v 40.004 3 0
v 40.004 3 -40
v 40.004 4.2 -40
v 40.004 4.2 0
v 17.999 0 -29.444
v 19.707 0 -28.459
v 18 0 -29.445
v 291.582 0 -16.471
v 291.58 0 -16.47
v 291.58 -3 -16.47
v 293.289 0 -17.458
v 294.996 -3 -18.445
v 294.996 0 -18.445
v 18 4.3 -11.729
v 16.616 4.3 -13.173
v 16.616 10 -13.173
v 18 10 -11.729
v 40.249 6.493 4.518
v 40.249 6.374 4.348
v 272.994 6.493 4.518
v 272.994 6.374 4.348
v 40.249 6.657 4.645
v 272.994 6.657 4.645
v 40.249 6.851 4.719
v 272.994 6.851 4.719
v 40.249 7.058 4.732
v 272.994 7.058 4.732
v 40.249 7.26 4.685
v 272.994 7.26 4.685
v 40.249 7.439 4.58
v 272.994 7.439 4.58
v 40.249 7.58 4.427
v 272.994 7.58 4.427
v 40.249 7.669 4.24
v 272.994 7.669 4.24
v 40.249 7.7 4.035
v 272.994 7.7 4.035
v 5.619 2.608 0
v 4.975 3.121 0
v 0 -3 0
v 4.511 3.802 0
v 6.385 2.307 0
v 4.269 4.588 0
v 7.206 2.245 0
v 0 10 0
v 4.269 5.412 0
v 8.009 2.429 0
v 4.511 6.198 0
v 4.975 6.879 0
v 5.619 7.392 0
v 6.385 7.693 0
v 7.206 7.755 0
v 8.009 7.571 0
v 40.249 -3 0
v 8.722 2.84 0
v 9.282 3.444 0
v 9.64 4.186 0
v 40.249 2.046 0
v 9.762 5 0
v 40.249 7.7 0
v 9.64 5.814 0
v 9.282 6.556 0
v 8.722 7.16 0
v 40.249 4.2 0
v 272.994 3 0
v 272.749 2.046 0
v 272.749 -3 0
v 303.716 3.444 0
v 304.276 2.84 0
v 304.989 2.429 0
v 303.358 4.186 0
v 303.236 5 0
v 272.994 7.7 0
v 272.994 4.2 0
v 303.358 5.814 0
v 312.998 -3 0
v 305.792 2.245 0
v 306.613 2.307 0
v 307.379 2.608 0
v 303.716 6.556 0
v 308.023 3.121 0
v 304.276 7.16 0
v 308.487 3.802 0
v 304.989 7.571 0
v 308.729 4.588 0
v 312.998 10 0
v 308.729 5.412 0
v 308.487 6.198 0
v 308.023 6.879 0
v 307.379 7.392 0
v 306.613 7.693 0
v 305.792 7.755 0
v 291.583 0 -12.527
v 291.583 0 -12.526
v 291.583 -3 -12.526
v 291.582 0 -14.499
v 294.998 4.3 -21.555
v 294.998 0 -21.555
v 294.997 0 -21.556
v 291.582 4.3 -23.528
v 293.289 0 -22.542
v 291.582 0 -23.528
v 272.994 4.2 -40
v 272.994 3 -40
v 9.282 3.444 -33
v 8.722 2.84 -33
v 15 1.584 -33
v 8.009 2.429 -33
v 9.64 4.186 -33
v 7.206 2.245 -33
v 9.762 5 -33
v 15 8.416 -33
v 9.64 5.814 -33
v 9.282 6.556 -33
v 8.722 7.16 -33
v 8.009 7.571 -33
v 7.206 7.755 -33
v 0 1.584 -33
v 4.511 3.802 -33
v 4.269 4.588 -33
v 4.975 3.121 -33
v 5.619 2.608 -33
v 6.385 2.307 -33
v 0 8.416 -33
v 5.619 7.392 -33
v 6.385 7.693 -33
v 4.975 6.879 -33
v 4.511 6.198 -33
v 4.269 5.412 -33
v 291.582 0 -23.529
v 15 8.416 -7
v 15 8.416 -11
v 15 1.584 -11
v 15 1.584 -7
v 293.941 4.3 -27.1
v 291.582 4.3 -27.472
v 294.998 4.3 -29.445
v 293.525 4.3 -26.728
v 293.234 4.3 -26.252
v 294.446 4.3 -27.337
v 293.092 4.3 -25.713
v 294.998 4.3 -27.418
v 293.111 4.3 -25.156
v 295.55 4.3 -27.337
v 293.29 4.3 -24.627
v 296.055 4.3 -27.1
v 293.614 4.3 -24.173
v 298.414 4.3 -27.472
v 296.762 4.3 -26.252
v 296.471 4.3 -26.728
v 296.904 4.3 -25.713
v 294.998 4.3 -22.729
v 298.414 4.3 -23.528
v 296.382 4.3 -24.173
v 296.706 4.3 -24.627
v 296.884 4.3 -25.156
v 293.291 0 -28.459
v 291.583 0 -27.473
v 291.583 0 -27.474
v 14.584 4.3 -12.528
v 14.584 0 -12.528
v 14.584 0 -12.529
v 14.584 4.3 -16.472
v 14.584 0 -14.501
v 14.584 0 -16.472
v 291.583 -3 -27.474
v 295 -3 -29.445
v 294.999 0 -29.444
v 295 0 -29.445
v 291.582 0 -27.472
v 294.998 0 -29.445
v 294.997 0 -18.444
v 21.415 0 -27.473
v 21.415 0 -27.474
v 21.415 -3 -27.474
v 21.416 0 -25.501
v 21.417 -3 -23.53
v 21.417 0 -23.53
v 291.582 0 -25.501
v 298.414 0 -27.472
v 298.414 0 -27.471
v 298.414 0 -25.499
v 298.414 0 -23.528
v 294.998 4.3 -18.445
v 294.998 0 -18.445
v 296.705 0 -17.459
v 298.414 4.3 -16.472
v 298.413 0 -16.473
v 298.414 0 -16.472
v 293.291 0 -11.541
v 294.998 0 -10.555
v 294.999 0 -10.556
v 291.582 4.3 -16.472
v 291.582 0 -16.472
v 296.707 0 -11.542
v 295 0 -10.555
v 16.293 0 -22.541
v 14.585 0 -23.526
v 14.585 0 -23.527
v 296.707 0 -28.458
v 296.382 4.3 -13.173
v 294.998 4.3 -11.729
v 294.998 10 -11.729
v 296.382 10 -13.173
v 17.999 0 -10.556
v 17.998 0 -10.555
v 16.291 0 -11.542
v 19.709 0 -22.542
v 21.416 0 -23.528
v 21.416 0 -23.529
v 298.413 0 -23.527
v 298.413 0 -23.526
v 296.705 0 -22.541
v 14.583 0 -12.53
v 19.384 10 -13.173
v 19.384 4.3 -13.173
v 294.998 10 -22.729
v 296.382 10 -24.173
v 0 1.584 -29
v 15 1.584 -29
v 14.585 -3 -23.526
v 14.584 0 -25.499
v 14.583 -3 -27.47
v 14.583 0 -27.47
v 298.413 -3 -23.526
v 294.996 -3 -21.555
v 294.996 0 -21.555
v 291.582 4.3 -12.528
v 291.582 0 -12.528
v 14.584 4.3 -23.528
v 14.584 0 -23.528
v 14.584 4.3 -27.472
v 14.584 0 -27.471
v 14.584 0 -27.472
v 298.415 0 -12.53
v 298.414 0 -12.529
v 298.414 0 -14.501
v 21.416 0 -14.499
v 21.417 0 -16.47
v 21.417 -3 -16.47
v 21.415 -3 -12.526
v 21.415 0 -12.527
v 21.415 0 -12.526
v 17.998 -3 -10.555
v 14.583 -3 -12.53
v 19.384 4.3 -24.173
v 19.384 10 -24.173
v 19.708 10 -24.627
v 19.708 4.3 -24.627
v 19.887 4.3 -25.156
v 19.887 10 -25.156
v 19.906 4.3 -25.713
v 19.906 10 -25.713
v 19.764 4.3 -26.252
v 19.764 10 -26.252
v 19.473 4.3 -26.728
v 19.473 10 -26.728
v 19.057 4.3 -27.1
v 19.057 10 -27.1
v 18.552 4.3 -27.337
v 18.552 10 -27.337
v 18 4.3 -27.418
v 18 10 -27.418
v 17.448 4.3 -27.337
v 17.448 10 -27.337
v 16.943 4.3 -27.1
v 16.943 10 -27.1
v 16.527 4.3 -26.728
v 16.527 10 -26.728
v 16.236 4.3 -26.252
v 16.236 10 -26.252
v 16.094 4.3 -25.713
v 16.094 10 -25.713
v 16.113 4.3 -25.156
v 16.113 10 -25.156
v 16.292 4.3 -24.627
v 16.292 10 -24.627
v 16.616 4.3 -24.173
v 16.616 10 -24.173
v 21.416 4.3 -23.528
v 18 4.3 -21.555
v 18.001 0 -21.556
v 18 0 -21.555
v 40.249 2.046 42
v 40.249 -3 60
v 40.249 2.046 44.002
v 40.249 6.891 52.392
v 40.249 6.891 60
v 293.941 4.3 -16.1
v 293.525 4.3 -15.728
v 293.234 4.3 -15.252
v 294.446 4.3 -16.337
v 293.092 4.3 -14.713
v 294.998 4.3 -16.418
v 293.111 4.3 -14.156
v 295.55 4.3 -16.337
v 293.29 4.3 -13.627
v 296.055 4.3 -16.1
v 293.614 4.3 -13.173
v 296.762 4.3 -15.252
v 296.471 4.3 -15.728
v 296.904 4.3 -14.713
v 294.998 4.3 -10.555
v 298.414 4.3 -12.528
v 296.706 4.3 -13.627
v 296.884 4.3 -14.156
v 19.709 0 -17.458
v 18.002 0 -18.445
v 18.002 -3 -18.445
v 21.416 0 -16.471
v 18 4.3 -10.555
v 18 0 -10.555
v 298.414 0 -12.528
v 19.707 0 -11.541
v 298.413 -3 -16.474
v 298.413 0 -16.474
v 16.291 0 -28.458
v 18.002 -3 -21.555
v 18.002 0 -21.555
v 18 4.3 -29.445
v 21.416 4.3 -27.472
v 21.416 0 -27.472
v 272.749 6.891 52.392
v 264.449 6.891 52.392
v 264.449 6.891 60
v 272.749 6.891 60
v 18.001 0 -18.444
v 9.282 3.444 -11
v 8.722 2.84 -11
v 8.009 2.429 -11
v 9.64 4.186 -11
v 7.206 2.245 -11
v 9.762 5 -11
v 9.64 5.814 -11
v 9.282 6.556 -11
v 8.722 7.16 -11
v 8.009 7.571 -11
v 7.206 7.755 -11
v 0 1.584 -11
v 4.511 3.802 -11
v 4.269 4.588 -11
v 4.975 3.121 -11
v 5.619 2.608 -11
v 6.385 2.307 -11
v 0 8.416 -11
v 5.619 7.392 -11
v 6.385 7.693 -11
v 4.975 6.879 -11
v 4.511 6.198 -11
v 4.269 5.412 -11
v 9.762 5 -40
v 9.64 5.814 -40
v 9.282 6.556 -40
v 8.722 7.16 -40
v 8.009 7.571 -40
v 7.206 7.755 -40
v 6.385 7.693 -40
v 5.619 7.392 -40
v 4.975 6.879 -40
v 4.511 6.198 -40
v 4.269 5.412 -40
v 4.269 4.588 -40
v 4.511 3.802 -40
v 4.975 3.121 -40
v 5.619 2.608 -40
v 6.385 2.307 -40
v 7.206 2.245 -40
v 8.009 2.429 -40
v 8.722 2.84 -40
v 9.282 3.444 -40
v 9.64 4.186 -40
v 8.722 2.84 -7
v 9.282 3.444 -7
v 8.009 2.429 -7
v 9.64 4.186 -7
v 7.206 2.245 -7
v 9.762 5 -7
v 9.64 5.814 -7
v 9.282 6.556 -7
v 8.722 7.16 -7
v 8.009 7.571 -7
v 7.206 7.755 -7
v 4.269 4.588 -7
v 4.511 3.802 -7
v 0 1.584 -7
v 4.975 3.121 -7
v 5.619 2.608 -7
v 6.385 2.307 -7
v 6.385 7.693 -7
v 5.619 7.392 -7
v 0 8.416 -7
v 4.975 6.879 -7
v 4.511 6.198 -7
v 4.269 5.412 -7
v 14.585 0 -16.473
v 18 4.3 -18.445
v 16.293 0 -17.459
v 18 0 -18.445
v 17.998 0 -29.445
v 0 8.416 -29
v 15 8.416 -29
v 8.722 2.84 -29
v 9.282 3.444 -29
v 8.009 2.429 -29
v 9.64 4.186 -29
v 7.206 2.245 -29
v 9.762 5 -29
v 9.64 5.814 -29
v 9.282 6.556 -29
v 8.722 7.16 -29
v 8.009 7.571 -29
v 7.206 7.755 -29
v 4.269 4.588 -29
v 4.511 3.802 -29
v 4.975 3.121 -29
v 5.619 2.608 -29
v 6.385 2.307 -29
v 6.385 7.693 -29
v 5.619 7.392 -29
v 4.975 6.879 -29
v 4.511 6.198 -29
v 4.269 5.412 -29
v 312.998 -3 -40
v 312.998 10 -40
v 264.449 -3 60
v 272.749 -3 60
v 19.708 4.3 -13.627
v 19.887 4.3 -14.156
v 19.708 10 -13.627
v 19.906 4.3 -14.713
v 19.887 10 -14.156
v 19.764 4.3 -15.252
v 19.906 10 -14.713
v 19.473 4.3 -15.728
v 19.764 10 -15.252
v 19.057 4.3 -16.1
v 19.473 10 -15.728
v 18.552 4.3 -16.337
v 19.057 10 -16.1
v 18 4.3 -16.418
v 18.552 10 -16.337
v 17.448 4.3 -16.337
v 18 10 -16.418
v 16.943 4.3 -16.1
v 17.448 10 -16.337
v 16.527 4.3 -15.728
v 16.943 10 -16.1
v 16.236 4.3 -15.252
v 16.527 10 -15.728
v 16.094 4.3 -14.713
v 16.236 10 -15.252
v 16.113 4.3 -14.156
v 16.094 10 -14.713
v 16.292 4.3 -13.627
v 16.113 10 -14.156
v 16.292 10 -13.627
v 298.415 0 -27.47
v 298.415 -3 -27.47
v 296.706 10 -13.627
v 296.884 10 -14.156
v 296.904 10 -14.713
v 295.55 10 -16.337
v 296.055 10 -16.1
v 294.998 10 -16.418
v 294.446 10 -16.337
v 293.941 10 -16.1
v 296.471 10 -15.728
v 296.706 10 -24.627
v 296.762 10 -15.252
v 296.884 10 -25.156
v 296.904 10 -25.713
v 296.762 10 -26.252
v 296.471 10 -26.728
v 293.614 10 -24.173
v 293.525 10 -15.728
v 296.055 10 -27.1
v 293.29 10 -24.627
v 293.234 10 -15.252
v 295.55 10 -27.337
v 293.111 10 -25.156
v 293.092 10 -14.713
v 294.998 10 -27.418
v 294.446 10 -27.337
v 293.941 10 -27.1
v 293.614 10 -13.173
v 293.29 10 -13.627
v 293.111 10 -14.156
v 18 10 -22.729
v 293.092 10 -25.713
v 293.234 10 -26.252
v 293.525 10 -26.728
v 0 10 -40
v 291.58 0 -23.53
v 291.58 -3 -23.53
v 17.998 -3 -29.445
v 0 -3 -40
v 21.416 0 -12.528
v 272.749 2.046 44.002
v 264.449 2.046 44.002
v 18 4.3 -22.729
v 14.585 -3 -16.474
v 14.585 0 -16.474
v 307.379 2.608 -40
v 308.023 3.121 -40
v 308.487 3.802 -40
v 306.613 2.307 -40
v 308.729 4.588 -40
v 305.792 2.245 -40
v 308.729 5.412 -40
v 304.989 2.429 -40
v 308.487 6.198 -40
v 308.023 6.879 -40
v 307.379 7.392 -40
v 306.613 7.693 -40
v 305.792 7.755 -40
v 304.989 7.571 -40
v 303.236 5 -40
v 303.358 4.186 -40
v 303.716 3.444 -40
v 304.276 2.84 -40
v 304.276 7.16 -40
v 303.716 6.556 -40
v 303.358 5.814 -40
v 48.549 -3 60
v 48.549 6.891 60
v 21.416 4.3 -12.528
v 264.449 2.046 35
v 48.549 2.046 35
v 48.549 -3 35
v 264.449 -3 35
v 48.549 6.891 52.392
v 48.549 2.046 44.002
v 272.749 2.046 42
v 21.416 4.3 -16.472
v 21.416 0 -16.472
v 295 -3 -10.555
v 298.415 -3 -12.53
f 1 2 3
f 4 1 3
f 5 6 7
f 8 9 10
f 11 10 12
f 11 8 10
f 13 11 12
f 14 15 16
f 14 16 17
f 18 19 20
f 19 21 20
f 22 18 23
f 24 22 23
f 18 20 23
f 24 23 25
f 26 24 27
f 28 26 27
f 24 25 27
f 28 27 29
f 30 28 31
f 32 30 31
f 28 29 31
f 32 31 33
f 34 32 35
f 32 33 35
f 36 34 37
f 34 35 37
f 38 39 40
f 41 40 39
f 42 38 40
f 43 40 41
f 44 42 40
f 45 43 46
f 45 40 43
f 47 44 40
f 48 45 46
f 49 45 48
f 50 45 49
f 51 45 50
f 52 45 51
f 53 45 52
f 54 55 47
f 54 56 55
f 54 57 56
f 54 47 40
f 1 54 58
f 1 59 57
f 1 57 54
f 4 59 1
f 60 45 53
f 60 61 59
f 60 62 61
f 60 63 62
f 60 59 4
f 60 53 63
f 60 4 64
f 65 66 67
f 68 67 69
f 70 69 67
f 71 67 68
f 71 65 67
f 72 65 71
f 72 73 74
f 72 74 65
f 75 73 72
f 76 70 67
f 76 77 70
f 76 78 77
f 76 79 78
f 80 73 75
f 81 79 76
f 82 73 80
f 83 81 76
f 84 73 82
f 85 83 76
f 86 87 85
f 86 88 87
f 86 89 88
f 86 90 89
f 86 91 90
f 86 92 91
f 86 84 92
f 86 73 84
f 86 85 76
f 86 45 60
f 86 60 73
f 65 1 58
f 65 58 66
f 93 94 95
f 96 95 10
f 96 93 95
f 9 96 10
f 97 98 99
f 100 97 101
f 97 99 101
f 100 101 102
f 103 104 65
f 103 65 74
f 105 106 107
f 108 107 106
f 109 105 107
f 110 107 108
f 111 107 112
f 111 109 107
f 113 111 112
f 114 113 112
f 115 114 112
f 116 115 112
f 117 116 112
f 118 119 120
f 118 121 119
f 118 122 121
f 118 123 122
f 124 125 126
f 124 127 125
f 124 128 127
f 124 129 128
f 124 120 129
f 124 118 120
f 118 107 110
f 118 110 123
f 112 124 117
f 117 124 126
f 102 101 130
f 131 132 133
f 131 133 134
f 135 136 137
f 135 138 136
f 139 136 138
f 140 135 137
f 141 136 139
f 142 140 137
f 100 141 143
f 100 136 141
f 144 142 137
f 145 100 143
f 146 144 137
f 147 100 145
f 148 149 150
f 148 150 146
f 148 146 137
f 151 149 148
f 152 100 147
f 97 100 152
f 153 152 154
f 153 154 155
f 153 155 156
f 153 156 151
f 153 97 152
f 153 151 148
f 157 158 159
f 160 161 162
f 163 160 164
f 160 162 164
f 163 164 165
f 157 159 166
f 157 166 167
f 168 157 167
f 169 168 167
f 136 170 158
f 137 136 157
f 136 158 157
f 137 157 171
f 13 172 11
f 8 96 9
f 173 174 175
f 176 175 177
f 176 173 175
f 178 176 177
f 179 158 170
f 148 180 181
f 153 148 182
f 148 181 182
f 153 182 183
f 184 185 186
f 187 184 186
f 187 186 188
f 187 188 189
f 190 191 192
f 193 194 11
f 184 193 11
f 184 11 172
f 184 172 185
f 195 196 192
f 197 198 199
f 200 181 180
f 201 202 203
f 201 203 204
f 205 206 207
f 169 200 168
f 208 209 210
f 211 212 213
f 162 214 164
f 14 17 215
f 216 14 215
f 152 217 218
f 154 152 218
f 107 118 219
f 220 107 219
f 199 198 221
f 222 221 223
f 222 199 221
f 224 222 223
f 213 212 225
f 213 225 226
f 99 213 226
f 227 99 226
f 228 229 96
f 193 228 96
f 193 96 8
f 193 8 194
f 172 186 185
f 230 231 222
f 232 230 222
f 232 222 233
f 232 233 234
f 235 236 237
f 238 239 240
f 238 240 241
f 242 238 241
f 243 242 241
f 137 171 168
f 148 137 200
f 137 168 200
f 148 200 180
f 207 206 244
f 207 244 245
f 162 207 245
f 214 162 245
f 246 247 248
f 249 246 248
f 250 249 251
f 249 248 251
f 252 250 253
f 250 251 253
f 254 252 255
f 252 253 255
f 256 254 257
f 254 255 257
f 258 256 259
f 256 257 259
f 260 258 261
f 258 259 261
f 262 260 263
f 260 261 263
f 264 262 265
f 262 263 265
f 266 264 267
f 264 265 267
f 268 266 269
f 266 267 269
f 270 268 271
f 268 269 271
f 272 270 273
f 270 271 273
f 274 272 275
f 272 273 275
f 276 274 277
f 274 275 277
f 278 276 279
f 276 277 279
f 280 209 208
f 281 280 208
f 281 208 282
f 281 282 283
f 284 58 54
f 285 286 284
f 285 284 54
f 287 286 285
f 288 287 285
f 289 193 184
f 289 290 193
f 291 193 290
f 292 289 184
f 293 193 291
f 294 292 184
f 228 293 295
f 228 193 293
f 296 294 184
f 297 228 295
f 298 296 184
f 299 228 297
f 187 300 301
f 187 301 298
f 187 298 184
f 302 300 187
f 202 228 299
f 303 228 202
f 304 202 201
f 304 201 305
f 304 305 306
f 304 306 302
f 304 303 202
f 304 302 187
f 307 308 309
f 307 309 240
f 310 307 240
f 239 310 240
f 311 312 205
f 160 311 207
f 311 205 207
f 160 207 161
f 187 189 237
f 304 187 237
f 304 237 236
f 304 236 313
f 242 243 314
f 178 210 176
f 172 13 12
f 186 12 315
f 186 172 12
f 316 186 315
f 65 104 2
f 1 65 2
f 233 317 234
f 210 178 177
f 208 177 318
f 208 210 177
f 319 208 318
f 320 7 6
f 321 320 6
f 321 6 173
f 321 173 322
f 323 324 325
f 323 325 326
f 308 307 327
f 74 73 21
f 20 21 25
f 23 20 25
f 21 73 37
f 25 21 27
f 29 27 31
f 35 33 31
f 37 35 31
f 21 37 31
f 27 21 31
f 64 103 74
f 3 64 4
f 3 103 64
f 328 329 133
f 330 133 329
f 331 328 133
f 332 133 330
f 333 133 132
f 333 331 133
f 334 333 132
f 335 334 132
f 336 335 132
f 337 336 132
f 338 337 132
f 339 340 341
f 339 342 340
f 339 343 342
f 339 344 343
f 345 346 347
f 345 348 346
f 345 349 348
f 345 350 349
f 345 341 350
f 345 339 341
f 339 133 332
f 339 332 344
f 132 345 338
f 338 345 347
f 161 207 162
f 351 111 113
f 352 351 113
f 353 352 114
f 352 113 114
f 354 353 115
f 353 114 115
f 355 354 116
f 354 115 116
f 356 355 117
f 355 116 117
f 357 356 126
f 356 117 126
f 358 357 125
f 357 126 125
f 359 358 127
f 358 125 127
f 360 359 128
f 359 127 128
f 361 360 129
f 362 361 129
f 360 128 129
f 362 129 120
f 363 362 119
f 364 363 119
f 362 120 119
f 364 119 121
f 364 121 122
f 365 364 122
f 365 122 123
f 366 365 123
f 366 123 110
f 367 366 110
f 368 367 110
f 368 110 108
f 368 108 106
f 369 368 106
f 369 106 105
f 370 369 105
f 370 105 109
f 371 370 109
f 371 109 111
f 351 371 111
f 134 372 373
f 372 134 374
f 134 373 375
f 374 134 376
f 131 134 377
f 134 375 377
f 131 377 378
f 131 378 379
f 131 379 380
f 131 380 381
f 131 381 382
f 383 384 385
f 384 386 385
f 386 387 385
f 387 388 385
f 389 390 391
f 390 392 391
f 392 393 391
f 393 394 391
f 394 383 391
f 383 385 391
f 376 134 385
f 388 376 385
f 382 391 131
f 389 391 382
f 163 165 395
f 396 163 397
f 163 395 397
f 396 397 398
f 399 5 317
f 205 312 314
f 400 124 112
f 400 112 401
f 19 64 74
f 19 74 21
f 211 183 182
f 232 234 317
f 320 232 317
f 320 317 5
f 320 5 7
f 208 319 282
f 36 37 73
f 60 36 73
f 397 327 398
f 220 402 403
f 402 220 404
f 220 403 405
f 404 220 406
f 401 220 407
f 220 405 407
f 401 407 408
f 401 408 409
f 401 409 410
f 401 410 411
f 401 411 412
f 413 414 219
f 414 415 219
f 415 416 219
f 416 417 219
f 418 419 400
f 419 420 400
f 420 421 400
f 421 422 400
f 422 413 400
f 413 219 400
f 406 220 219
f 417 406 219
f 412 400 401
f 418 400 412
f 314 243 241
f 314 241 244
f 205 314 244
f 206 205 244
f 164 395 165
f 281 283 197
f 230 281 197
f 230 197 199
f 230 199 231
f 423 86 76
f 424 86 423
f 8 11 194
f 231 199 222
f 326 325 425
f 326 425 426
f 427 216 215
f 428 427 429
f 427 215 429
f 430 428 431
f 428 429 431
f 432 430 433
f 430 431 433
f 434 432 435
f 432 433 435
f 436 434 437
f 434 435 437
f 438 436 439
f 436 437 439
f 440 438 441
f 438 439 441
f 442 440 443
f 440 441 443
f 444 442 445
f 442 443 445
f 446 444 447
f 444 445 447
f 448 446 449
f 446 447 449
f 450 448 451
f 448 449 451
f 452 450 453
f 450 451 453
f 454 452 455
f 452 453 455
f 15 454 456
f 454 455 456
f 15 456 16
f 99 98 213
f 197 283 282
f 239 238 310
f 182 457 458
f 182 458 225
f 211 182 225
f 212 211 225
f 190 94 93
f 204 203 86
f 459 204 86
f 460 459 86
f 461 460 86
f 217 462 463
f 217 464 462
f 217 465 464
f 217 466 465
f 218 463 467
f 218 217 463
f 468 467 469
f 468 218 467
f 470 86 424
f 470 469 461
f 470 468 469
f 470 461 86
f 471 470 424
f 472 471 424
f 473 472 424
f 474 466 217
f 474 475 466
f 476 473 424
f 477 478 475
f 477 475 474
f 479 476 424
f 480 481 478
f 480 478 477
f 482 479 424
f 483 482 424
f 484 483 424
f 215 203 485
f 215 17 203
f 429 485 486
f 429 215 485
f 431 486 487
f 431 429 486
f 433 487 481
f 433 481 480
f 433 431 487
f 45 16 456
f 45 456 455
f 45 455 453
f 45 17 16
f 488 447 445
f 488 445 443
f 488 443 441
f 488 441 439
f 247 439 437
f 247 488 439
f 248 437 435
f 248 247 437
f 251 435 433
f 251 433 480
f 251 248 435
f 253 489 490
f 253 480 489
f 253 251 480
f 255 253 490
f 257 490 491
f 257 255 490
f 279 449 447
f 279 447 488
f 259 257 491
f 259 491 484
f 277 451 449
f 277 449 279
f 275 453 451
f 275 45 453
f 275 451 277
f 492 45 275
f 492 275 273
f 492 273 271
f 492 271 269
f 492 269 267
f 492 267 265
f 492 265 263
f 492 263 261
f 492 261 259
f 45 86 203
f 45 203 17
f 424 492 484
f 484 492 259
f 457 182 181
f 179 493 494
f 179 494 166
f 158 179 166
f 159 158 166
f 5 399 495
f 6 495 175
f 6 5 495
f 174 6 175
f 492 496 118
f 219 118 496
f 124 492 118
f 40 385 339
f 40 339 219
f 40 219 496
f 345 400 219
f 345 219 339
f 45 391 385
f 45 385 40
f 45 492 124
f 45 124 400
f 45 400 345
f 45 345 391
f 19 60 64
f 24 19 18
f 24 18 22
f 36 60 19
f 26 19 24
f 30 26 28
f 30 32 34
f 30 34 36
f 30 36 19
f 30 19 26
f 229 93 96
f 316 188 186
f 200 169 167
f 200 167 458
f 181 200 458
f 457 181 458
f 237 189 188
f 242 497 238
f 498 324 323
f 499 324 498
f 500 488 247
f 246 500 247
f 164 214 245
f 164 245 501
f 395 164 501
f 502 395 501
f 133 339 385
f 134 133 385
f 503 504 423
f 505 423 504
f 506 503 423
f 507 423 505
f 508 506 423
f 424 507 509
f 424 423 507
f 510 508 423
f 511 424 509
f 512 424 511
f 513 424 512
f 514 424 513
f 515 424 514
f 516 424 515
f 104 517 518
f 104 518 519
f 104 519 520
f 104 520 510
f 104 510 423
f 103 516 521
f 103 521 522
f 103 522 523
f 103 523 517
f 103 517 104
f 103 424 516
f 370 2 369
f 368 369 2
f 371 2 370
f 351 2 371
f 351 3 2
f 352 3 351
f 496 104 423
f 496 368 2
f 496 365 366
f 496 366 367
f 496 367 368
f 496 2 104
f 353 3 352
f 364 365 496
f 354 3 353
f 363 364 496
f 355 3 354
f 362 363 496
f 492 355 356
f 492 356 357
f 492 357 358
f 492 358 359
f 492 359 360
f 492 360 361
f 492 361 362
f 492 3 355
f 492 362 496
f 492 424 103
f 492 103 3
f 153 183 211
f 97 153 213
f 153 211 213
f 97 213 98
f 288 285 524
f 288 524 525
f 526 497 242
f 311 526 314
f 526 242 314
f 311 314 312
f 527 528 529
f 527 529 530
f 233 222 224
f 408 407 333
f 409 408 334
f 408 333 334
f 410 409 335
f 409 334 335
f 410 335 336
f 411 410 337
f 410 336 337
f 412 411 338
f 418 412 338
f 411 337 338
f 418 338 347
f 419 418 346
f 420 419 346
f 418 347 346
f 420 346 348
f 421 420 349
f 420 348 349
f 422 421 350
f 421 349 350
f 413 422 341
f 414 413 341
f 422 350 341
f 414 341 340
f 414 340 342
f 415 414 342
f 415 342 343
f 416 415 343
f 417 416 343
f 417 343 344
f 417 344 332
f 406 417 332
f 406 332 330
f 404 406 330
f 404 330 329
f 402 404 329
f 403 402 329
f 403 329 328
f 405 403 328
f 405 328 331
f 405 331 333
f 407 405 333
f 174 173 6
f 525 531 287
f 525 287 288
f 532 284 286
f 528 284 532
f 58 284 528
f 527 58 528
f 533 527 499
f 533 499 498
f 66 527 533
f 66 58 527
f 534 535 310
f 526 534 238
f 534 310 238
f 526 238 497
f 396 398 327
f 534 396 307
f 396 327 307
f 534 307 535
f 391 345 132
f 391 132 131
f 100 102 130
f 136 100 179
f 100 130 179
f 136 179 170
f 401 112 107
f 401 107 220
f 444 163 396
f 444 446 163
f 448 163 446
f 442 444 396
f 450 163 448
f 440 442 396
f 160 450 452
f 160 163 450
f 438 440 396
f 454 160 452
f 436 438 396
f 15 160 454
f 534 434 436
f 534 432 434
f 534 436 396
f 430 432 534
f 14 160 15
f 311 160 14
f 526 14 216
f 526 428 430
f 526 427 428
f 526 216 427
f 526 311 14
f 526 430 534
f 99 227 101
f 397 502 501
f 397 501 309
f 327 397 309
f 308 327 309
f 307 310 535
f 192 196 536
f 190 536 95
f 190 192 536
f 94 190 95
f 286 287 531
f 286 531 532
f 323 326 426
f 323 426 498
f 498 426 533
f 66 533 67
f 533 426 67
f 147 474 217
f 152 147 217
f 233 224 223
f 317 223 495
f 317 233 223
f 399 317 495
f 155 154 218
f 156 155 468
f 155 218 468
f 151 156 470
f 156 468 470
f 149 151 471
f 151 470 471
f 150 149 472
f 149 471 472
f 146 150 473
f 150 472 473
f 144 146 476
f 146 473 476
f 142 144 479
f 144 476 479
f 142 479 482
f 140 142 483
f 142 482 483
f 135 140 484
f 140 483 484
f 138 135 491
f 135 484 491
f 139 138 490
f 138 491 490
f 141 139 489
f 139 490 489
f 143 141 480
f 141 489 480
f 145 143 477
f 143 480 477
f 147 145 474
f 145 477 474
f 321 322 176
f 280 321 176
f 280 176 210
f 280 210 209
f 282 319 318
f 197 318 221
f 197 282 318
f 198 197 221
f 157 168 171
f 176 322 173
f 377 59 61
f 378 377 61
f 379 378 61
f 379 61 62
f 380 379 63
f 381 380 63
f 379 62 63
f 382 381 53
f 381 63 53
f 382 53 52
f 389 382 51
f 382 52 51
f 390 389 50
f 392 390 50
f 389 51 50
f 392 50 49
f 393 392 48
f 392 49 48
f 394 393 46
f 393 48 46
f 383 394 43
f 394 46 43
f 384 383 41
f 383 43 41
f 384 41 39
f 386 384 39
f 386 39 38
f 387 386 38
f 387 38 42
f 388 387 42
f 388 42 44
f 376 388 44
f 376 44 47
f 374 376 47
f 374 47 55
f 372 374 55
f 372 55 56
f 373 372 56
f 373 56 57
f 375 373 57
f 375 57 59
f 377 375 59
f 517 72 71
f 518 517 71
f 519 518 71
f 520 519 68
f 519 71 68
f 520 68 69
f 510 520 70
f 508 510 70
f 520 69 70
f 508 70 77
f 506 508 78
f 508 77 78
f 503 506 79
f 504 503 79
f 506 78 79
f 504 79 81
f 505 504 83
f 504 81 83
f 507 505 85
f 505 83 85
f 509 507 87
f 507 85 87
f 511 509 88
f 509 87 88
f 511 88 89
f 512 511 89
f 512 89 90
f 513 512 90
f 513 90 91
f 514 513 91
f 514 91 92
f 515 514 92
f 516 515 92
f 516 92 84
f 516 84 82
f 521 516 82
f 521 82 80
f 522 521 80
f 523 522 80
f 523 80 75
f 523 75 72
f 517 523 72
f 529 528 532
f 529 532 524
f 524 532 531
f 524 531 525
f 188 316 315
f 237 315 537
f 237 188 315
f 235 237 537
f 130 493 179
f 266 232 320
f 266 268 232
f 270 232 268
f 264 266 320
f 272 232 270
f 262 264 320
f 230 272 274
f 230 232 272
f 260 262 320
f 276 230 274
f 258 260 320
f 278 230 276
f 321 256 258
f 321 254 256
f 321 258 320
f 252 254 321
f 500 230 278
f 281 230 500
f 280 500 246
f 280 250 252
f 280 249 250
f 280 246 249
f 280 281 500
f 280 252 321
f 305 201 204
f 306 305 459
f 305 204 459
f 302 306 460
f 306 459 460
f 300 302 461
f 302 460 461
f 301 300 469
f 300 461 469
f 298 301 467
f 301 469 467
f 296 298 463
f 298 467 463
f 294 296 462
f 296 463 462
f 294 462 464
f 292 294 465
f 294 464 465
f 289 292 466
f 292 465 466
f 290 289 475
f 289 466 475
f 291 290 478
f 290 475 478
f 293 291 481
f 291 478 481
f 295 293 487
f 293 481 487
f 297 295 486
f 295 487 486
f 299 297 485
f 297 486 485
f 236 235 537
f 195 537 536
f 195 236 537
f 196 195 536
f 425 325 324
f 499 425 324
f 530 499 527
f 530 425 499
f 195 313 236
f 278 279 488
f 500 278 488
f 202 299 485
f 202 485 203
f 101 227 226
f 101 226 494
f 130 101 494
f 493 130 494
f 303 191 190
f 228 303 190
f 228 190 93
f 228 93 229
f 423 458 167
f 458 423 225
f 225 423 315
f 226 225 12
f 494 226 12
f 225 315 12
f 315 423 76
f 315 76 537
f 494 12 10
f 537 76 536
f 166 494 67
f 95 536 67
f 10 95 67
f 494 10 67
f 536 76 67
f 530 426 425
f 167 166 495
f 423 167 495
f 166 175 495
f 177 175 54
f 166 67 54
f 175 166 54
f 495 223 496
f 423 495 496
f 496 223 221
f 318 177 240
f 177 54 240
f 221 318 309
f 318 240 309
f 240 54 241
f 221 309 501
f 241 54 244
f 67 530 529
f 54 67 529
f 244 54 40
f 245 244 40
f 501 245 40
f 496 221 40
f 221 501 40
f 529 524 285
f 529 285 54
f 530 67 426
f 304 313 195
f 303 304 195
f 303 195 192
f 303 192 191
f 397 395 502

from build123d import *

# Parameters (mm, degrees)
SKETCH1_W           = 40
SKETCH1_H           = 10
BOSS_EXTRUDE1_DEPTH = 312.997959
SKETCH2_W           = 232.99
SKETCH2_H           = 1.2
CUT_EXTRUDE1_DEPTH  = 316.701951749
SKETCH3_R           = 1.9177
CUT_EXTRUDE2_DEPTH  = 316.701951749
CUT_EXTRUDE3_DEPTH  = 4.3
SKETCH5_R           = 2.762258299
CUT_EXTRUDE4_DEPTH  = 316.701951749
SKETCH6_W           = 4
SKETCH6_H           = 6.8326
CUT_EXTRUDE5_DEPTH  = 15
SKETCH7_W           = 232.5
SKETCH7_H           = 2.046306953
BOSS_EXTRUDE2_DEPTH = 60
CUT_EXTRUDE6_REACH  = 320.796
SKETCH8_W           = 215.9
SKETCH8_H           = 25
BOSS_EXTRUDE3_DEPTH = 3
SKETCH10_W          = 18
SKETCH10_H          = 4.844296322
BOSS_EXTRUDE4_DEPTH = 8.3
BOSS_EXTRUDE6_DEPTH = 232.745
FILLET1_R           = 0.7
SKETCH15_W          = 8.3
SKETCH15_H          = 18
BOSS_EXTRUDE8_DEPTH = 4.844296322
CUT_EXTRUDE8_DEPTH  = 319.961944969
CHAMFER1_SIZE       = 10.392304845
CHAMFER1_SIZE_2     = 6


with BuildPart() as part:
    # Sketch1 → Boss-Extrude1 (new body)
    with BuildSketch(Plane(origin=(0, 0, 0), x_dir=(0, 0, -1), z_dir=(1, 0, 0))):
        with Locations((20, 5)):
            Rectangle(SKETCH1_W, SKETCH1_H)
    extrude(amount=BOSS_EXTRUDE1_DEPTH)

    # Sketch2 → Cut-Extrude1 (cut, through all)
    with BuildSketch(Plane(origin=(0, 0, -40), x_dir=(-1, 0, 0), z_dir=(0, 0, -1))):
        with Locations((-156.4989795, 3.6)):
            Rectangle(SKETCH2_W, SKETCH2_H)
    extrude(amount=-CUT_EXTRUDE1_DEPTH, mode=Mode.SUBTRACT)

    # Sketch3 → Cut-Extrude2 (cut, through all)
    with BuildSketch(Plane(origin=(0, 10, 0), x_dir=(1, 0, 0), z_dir=(0, 1, 0))):
        with Locations(Location((294.997959, 25.5, 0), (0, 0, 270))):
            Circle(SKETCH3_R)
        with Locations(Location((294.997959, 14.5, 0), (0, 0, 270))):
            Circle(SKETCH3_R)
        with Locations(Location((18, 14.5, 0), (0, 0, 90))):
            Circle(SKETCH3_R)
        with Locations(Location((18, 25.5, 0), (0, 0, 90))):
            Circle(SKETCH3_R)
    extrude(amount=-CUT_EXTRUDE2_DEPTH, mode=Mode.SUBTRACT)

    # Sketch4 → Cut-Extrude3 (cut)
    with BuildSketch(Plane.XZ):
        Polygon((14.5837, -12.527598275), (14.5837, -16.472401725), (18, -18.444803449), (21.4163, -16.472401725), (21.4163, -12.527598275), (18, -10.555196551), align=None)
        Polygon((14.5837, -23.527598275), (14.5837, -27.472401725), (18, -29.444803449), (21.4163, -27.472401725), (21.4163, -23.527598275), (18, -21.555196551), align=None)
        Polygon((298.414259, -12.527598275), (294.997959, -10.555196551), (291.581659, -12.527598275), (291.581659, -16.472401725), (294.997959, -18.444803449), (298.414259, -16.472401725), align=None)
        Polygon((291.581659, -23.527598275), (291.581659, -27.472401725), (294.997959, -29.444803449), (298.414259, -27.472401725), (298.414259, -23.527598275), (294.997959, -21.555196551), align=None)
    extrude(amount=-CUT_EXTRUDE3_DEPTH, mode=Mode.SUBTRACT)

    # Sketch5 → Cut-Extrude4 (cut, through all)
    with BuildSketch(Plane.XY):
        with Locations((7, 5)):
            Circle(SKETCH5_R)
        with Locations(Location((305.997959, 5, 0), (0, 0, 180))):
            Circle(SKETCH5_R)
    extrude(amount=-CUT_EXTRUDE4_DEPTH, mode=Mode.SUBTRACT)

    # Sketch6 → Cut-Extrude5 (cut)
    with BuildSketch(Plane.ZY):
        with Locations((-31, 5)):
            Rectangle(SKETCH6_W, SKETCH6_H)
        with Locations((-9, 5)):
            Rectangle(SKETCH6_W, SKETCH6_H)
    extrude(amount=-CUT_EXTRUDE5_DEPTH, mode=Mode.SUBTRACT)

    # Sketch7 → Boss-Extrude2 (add)
    with BuildSketch(Plane.XY):
        with Locations((156.4989795, 1.023153477)):
            Rectangle(SKETCH7_W, SKETCH7_H)
    extrude(amount=BOSS_EXTRUDE2_DEPTH)

    # Sketch8 → Cut-Extrude6 (cut, up to next)
    with BuildSketch(Plane(origin=(0, 2.046306953, 0), x_dir=(1, 0, 0), z_dir=(0, 1, 0)), mode=Mode.PRIVATE) as cut_extrude6_sk1:
        with Locations((156.4989795, -47.5)):
            Rectangle(SKETCH8_W, SKETCH8_H)
    cut_extrude6_tool1 = extrude(cut_extrude6_sk1.sketch, amount=-CUT_EXTRUDE6_REACH, mode=Mode.PRIVATE) & part.part
    add(cut_extrude6_tool1.solids().sort_by_distance((156.49898, 2.046307, 47.5))[0], mode=Mode.SUBTRACT)

    # Sketch9 → Boss-Extrude3 (add)
    with BuildSketch(Plane.XZ):
        Polygon((0, -40), (0, 0), (40.2489795, 0), (40.2489795, 60), (48.5489795, 60), (48.5489795, 35), (264.4489795, 35), (264.4489795, 60), (272.7489795, 60), (272.7489795, 0), (312.997959, 0), (312.997959, -40), align=None)
        Polygon((17.997668231, -10.55519724), (14.582534712, -12.529617991), (14.584866481, -16.474420751), (18.002331769, -18.44480276), (21.417465288, -16.470382009), (21.415133519, -12.525579249), align=None, mode=Mode.SUBTRACT)
        Polygon((18.002331769, -21.55519724), (14.584866481, -23.525579249), (14.582534712, -27.470382009), (17.997668231, -29.44480276), (21.415133519, -27.474420751), (21.417465288, -23.529617991), align=None, mode=Mode.SUBTRACT)
        Polygon((295.000290769, -10.55519724), (291.582825481, -12.525579249), (291.580493712, -16.470382009), (294.995627231, -18.44480276), (298.413092519, -16.474420751), (298.415424288, -12.529617991), align=None, mode=Mode.SUBTRACT)
        Polygon((294.995627231, -21.55519724), (291.580493712, -23.529617991), (291.582825481, -27.474420751), (295.000290769, -29.44480276), (298.415424288, -27.470382009), (298.413092519, -23.525579249), align=None, mode=Mode.SUBTRACT)
    extrude(amount=BOSS_EXTRUDE3_DEPTH)

    # Sketch10 → Boss-Extrude4 (add)
    with BuildSketch(Plane.ZY.offset(-40.2489795)):
        with Locations((51, 4.468455114)):
            Rectangle(SKETCH10_W, SKETCH10_H)
    extrude(amount=-BOSS_EXTRUDE4_DEPTH)

    # Sketch12 → Boss-Extrude6 (add)
    with BuildSketch(Plane.ZY.offset(-40.2489795)):
        Polygon((0, 4.2), (7, 7.7), (0, 7.7), align=None)
    extrude(amount=-BOSS_EXTRUDE6_DEPTH)

    # Fillet1
    fillet1_edges = [part.edges().sort_by_distance(p)[0] for p in [
        (156.6214795, 7.7, 7),
    ]]
    fillet(fillet1_edges, radius=FILLET1_R)

    # Sketch15 → Boss-Extrude8 (add)
    with BuildSketch(Plane(origin=(0, 2.046306953, 0), x_dir=(1, 0, 0), z_dir=(0, 1, 0))):
        with Locations((268.5989795, -51)):
            Rectangle(SKETCH15_W, SKETCH15_H)
    extrude(amount=BOSS_EXTRUDE8_DEPTH)

    # Sketch16 → Cut-Extrude8 (cut, through all)
    with BuildSketch(Plane(origin=(0, 10, 0), x_dir=(1, 0, 0), z_dir=(0, 1, 0))):
        with BuildLine():
            Line((16.61580053, 24.172760339), (18, 22.729156574))
            Line((18, 22.729156574), (19.38419947, 24.172760339))
            ThreePointArc((19.38419947, 24.172760339), (18, 23.5823), (16.61580053, 24.172760339))
        make_face()
        with BuildLine():
            Line((16.61580053, 13.172760339), (18, 11.729156574))
            Line((18, 11.729156574), (19.38419947, 13.172760339))
            ThreePointArc((19.38419947, 13.172760339), (18, 12.5823), (16.61580053, 13.172760339))
        make_face()
        with BuildLine():
            Line((293.61375953, 13.172760339), (294.997959, 11.729156574))
            Line((294.997959, 11.729156574), (296.38215847, 13.172760339))
            ThreePointArc((296.38215847, 13.172760339), (294.997959, 12.5823), (293.61375953, 13.172760339))
        make_face()
        with BuildLine():
            Line((293.61375953, 24.172760339), (294.997959, 22.729156574))
            Line((294.997959, 22.729156574), (296.38215847, 24.172760339))
            ThreePointArc((296.38215847, 24.172760339), (294.997959, 23.5823), (293.61375953, 24.172760339))
        make_face()
    extrude(amount=-CUT_EXTRUDE8_DEPTH, mode=Mode.SUBTRACT)

    # Chamfer1
    # the kernel refuses this chamfer: 10.392304845, 6 mm, written as the material it takes off along each edge
    with BuildSketch(Plane(origin=(13.363195676, 6.890603275, 42), x_dir=(0, 0.019326765612700778, 0.9998132206222079), z_dir=(1, 0, 0))) as chamfer1_piece_1_section:
        Polygon((CHAMFER1_SIZE * 0.999813220662, CHAMFER1_SIZE * 0.0193267656135), (-CHAMFER1_SIZE_2 * 0.0193267656127, CHAMFER1_SIZE_2 * 0.999813220622), (0, 0), align=None)
    chamfer1_piece_1 = extrude(amount=62.071567647, mode=Mode.PRIVATE)
    chamfer1_piece_1 = split(chamfer1_piece_1, bisect_by=Plane(origin=(44.3989795, 2.046306953, 45.647661679), z_dir=(0, 1, 0)), keep=Keep.TOP, mode=Mode.PRIVATE)
    add(chamfer1_piece_1, mode=Mode.SUBTRACT)
    with BuildSketch(Plane(origin=(237.563195676, 6.890603275, 42), x_dir=(0, 0.019326765612700615, 0.9998132206222079), z_dir=(1, 0, 0))) as chamfer1_piece_2_section:
        Polygon((CHAMFER1_SIZE * 0.999813220662, CHAMFER1_SIZE * 0.0193267656135), (-CHAMFER1_SIZE_2 * 0.0193267656127, CHAMFER1_SIZE_2 * 0.999813220622), (0, 0), align=None)
    chamfer1_piece_2 = extrude(amount=62.071567647, mode=Mode.PRIVATE)
    chamfer1_piece_2 = split(chamfer1_piece_2, bisect_by=Plane(origin=(268.5989795, 2.046306953, 45.647661679), z_dir=(0, 1, 0)), keep=Keep.TOP, mode=Mode.PRIVATE)
    add(chamfer1_piece_2, mode=Mode.SUBTRACT)


solid = part.part
